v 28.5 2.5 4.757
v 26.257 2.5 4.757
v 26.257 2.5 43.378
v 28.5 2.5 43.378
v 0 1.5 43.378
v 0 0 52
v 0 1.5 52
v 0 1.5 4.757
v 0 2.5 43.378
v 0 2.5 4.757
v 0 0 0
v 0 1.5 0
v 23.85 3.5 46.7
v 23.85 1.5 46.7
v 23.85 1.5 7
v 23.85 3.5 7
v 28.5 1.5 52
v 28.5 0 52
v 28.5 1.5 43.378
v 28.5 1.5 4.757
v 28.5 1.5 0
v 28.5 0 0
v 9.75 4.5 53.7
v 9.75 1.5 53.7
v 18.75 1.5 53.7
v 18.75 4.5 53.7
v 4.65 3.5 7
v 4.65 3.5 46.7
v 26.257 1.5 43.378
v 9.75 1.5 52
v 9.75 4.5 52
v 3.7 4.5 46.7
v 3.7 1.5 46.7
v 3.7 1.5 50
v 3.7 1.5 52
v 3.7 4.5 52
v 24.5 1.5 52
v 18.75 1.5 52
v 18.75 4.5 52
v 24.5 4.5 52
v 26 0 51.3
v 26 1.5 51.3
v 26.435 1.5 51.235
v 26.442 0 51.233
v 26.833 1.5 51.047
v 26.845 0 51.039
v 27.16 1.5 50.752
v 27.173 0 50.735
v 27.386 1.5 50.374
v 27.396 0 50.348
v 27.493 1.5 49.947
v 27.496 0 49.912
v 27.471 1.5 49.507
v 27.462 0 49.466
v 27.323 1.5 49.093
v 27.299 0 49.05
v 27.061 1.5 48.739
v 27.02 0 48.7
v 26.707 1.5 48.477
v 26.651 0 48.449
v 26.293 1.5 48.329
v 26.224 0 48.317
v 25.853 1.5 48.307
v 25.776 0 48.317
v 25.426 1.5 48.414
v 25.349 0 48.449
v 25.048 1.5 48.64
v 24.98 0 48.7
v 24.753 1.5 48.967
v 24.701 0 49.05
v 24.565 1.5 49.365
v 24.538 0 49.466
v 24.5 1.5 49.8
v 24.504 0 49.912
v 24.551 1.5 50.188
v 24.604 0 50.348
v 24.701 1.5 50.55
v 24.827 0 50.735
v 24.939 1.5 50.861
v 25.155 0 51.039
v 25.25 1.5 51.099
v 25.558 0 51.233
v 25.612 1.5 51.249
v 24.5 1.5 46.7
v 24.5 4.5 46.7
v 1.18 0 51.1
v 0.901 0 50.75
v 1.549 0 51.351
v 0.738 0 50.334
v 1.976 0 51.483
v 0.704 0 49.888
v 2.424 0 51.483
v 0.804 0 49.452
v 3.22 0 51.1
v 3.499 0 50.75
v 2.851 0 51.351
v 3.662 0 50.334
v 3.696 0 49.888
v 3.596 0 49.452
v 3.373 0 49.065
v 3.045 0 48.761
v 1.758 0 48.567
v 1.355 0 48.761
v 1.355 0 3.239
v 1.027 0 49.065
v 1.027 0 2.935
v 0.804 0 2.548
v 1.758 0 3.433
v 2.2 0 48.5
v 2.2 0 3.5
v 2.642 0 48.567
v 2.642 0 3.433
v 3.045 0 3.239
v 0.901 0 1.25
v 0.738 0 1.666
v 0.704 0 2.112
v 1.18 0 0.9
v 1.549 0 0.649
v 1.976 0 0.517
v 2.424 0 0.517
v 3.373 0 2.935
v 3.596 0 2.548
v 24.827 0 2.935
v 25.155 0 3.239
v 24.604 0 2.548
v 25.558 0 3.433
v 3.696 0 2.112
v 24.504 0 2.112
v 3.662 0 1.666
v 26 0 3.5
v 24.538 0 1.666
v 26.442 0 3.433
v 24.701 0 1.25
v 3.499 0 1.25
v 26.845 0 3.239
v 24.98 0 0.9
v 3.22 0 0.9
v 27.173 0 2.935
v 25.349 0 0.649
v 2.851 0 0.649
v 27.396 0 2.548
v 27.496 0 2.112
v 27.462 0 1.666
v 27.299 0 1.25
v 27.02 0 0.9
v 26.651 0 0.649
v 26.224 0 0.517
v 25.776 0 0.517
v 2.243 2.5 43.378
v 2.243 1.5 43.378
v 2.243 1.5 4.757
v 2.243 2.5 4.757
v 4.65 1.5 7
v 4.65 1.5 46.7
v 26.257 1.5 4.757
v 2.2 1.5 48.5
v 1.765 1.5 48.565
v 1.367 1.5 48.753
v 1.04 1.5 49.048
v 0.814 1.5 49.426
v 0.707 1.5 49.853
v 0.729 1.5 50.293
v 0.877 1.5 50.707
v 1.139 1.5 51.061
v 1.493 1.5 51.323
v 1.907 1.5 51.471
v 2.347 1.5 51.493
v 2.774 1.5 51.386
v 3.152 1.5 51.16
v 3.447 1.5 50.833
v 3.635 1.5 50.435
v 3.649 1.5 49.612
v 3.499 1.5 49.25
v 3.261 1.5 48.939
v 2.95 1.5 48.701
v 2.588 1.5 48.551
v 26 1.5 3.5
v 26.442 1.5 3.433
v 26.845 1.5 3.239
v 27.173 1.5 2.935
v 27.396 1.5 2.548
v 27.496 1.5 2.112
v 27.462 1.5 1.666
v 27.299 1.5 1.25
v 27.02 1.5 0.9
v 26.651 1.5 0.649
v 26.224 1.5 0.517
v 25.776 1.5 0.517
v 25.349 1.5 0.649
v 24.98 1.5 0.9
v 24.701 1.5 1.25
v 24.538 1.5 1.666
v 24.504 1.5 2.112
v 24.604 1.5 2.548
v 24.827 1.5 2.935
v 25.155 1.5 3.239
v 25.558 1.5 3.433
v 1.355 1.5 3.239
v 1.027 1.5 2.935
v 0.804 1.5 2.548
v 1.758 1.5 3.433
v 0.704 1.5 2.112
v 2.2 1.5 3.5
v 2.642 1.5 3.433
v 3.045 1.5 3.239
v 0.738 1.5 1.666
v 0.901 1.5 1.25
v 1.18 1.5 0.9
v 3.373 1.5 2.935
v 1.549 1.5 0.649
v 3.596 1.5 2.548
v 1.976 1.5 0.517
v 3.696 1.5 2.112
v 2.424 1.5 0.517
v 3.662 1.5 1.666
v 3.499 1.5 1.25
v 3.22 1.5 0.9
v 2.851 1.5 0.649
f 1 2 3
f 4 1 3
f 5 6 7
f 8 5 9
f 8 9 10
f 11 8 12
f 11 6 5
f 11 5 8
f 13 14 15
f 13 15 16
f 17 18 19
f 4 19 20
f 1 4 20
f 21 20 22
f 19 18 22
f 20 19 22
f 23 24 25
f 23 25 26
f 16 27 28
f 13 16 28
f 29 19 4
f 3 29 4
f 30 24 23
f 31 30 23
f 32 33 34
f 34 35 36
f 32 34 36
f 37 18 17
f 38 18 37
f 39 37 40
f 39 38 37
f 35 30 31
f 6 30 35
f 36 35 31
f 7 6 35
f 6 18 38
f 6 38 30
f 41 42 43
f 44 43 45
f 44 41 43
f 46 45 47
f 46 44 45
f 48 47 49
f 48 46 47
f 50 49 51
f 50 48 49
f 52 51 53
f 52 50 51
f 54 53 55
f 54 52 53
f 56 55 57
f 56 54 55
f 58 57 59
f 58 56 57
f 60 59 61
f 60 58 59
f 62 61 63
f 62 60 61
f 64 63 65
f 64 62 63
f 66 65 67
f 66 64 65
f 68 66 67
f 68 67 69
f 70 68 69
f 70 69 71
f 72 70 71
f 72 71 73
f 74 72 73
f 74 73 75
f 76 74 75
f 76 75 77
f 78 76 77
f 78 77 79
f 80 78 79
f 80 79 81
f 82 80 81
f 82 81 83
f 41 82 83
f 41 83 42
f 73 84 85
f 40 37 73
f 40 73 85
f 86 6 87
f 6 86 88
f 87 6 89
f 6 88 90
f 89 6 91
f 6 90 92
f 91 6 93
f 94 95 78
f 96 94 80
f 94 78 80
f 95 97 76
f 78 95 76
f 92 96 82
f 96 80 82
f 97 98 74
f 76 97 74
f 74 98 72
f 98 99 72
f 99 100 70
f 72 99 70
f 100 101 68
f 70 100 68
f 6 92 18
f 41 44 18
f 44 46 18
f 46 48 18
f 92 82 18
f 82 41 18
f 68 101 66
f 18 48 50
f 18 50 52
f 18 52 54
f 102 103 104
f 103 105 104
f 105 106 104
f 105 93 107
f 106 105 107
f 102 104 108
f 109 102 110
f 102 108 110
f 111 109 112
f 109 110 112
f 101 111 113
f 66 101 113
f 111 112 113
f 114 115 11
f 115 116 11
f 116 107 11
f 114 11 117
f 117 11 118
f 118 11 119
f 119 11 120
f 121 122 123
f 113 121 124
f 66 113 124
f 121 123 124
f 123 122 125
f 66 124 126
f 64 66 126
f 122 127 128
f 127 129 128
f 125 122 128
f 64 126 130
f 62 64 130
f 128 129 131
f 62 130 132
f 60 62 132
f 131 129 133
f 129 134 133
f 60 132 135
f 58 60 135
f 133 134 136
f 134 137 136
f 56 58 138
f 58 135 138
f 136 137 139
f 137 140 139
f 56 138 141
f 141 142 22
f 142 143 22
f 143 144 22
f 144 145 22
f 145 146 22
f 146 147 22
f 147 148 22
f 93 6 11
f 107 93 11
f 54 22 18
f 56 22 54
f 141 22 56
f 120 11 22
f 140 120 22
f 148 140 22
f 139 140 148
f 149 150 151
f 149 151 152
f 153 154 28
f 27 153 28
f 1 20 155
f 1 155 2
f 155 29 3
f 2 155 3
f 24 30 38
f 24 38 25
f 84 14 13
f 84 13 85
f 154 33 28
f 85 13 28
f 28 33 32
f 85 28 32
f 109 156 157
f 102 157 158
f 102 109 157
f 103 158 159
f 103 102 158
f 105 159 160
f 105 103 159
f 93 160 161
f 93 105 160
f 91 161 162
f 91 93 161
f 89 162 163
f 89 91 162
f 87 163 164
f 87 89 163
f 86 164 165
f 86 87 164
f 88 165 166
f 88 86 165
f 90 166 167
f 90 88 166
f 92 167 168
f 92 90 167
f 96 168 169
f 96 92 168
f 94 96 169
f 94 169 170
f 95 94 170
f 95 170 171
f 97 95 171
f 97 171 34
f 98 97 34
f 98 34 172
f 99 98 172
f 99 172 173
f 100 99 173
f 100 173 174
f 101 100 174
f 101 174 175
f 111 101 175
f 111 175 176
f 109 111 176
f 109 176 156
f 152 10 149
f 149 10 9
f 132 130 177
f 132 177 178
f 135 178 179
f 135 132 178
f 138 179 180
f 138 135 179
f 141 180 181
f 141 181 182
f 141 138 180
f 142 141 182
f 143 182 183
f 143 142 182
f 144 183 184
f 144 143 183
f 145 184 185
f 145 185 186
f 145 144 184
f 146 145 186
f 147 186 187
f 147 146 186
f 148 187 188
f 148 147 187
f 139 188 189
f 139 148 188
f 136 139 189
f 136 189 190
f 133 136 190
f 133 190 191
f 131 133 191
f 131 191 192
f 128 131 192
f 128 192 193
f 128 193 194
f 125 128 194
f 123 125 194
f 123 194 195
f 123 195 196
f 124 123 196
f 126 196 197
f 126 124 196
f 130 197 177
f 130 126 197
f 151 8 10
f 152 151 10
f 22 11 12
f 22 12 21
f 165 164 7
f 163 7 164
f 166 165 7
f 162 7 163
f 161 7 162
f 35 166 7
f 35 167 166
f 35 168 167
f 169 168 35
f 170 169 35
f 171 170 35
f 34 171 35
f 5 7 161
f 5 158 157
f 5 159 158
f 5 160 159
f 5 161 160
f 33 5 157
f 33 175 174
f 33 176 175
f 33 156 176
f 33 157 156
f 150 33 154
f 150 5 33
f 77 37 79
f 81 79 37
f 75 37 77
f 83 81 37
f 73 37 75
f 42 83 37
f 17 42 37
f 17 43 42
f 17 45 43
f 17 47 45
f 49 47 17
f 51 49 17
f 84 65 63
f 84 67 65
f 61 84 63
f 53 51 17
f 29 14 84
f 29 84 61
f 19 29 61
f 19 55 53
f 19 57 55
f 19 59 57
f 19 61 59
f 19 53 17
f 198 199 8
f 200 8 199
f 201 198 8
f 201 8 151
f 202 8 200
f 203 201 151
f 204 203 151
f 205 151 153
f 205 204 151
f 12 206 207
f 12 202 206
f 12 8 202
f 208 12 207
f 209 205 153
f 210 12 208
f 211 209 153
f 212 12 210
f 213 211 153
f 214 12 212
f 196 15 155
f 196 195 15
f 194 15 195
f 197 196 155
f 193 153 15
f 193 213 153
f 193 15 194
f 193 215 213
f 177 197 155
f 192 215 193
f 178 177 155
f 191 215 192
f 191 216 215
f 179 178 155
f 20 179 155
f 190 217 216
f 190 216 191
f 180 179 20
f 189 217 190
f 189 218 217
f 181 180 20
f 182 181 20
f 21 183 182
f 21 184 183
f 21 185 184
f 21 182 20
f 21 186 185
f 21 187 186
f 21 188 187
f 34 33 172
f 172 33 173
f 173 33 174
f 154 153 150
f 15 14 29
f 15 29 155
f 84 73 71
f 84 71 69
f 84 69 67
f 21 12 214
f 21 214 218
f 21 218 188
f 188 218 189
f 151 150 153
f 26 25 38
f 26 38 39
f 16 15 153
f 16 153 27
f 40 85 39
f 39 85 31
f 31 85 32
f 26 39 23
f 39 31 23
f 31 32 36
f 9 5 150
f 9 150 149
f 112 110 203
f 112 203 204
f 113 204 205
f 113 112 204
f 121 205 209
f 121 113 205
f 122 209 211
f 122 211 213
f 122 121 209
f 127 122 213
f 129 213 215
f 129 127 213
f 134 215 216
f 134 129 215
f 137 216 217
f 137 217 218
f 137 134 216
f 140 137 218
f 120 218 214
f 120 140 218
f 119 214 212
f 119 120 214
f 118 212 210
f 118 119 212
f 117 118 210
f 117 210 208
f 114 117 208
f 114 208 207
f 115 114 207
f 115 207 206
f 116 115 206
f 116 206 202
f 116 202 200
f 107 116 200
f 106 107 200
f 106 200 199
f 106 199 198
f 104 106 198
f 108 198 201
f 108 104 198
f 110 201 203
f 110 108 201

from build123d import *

# Parameters (mm, degrees)
SKETCH_2_W            = 28.5
SKETCH_2_H            = 52
SKETCH_2_R            = 1.5
EXTRUDE_1_DEPTH       = 1.5
EXTRUDE_START         = 4.65
EXTRUDE_2_DEPTH       = 19.2
EXTRUDE_2_2_OUTLINE_W = 1
EXTRUDE_2_2_OUTLINE_H = 38.620640838
EXTRUDE_2_2_DEPTH     = 2.24290402
EXTRUDE_START_2       = 26.25709598
EXTRUDE_2_3_OUTLINE_W = 1
EXTRUDE_2_3_OUTLINE_H = 38.620640838
EXTRUDE_2_3_DEPTH     = 2.24290402
EXTRUDE_START_3       = 9.75
EXTRUDE_2_4_OUTLINE_W = 3
EXTRUDE_2_4_OUTLINE_H = 1.7
EXTRUDE_2_4_DEPTH     = 9
EXTRUDE_START_4       = 3.7
EXTRUDE_2_5_OUTLINE_W = 3
EXTRUDE_2_5_OUTLINE_H = 5.3
EXTRUDE_2_5_DEPTH     = 20.8


# Read off the part's stored shape, not the designer's step: Бобышка-Вытянуть2
with BuildPart() as part:
    # Эскиз2 → Бобышка-Вытянуть1 (new body)
    with BuildSketch(Plane(origin=(0, 0, 0), x_dir=(1, 0, 0), z_dir=(0, 1, 0))):
        with Locations((14.25, -26)):
            Rectangle(SKETCH_2_W, SKETCH_2_H)
        with Locations(Location((2.2, -2, 0), (0, 0, 270))):
            Circle(SKETCH_2_R, mode=Mode.SUBTRACT)
        with Locations(Location((26, -2, 0), (0, 0, 270))):
            Circle(SKETCH_2_R, mode=Mode.SUBTRACT)
        with Locations(Location((2.2, -50, 0), (0, 0, 90))):
            Circle(SKETCH_2_R, mode=Mode.SUBTRACT)
        with Locations(Location((26, -49.8, 0), (0, 0, 270))):
            Circle(SKETCH_2_R, mode=Mode.SUBTRACT)
    extrude(amount=EXTRUDE_1_DEPTH)

    # Бобышка-Вытянуть2 outline → Бобышка-Вытянуть2 (add)
    with BuildSketch(Plane.YZ.offset(EXTRUDE_START)):
        Polygon((4.5, 52), (1.5, 52), (1.5, 7), (3.5, 7), (3.5, 46.7), (4.5, 46.7), align=None)
    extrude(amount=EXTRUDE_2_DEPTH)

    # Extrude 2 2 outline → Extrude 2 2 (add)
    with BuildSketch(Plane.YZ):
        with Locations((2, 24.067488006)):
            Rectangle(EXTRUDE_2_2_OUTLINE_W, EXTRUDE_2_2_OUTLINE_H)
    extrude(amount=EXTRUDE_2_2_DEPTH)

    # Extrude 2 3 outline → Extrude 2 3 (add)
    with BuildSketch(Plane.YZ.offset(EXTRUDE_START_2)):
        with Locations((2, 24.067488006)):
            Rectangle(EXTRUDE_2_3_OUTLINE_W, EXTRUDE_2_3_OUTLINE_H)
    extrude(amount=EXTRUDE_2_3_DEPTH)

    # Extrude 2 4 outline → Extrude 2 4 (add)
    with BuildSketch(Plane.YZ.offset(EXTRUDE_START_3)):
        with Locations((3, 52.85)):
            Rectangle(EXTRUDE_2_4_OUTLINE_W, EXTRUDE_2_4_OUTLINE_H)
    extrude(amount=EXTRUDE_2_4_DEPTH)

    # Extrude 2 5 outline → Extrude 2 5 (add)
    with BuildSketch(Plane.YZ.offset(EXTRUDE_START_4)):
        with Locations((3, 49.35)):
            Rectangle(EXTRUDE_2_5_OUTLINE_W, EXTRUDE_2_5_OUTLINE_H)
    extrude(amount=EXTRUDE_2_5_DEPTH)


solid = part.part
